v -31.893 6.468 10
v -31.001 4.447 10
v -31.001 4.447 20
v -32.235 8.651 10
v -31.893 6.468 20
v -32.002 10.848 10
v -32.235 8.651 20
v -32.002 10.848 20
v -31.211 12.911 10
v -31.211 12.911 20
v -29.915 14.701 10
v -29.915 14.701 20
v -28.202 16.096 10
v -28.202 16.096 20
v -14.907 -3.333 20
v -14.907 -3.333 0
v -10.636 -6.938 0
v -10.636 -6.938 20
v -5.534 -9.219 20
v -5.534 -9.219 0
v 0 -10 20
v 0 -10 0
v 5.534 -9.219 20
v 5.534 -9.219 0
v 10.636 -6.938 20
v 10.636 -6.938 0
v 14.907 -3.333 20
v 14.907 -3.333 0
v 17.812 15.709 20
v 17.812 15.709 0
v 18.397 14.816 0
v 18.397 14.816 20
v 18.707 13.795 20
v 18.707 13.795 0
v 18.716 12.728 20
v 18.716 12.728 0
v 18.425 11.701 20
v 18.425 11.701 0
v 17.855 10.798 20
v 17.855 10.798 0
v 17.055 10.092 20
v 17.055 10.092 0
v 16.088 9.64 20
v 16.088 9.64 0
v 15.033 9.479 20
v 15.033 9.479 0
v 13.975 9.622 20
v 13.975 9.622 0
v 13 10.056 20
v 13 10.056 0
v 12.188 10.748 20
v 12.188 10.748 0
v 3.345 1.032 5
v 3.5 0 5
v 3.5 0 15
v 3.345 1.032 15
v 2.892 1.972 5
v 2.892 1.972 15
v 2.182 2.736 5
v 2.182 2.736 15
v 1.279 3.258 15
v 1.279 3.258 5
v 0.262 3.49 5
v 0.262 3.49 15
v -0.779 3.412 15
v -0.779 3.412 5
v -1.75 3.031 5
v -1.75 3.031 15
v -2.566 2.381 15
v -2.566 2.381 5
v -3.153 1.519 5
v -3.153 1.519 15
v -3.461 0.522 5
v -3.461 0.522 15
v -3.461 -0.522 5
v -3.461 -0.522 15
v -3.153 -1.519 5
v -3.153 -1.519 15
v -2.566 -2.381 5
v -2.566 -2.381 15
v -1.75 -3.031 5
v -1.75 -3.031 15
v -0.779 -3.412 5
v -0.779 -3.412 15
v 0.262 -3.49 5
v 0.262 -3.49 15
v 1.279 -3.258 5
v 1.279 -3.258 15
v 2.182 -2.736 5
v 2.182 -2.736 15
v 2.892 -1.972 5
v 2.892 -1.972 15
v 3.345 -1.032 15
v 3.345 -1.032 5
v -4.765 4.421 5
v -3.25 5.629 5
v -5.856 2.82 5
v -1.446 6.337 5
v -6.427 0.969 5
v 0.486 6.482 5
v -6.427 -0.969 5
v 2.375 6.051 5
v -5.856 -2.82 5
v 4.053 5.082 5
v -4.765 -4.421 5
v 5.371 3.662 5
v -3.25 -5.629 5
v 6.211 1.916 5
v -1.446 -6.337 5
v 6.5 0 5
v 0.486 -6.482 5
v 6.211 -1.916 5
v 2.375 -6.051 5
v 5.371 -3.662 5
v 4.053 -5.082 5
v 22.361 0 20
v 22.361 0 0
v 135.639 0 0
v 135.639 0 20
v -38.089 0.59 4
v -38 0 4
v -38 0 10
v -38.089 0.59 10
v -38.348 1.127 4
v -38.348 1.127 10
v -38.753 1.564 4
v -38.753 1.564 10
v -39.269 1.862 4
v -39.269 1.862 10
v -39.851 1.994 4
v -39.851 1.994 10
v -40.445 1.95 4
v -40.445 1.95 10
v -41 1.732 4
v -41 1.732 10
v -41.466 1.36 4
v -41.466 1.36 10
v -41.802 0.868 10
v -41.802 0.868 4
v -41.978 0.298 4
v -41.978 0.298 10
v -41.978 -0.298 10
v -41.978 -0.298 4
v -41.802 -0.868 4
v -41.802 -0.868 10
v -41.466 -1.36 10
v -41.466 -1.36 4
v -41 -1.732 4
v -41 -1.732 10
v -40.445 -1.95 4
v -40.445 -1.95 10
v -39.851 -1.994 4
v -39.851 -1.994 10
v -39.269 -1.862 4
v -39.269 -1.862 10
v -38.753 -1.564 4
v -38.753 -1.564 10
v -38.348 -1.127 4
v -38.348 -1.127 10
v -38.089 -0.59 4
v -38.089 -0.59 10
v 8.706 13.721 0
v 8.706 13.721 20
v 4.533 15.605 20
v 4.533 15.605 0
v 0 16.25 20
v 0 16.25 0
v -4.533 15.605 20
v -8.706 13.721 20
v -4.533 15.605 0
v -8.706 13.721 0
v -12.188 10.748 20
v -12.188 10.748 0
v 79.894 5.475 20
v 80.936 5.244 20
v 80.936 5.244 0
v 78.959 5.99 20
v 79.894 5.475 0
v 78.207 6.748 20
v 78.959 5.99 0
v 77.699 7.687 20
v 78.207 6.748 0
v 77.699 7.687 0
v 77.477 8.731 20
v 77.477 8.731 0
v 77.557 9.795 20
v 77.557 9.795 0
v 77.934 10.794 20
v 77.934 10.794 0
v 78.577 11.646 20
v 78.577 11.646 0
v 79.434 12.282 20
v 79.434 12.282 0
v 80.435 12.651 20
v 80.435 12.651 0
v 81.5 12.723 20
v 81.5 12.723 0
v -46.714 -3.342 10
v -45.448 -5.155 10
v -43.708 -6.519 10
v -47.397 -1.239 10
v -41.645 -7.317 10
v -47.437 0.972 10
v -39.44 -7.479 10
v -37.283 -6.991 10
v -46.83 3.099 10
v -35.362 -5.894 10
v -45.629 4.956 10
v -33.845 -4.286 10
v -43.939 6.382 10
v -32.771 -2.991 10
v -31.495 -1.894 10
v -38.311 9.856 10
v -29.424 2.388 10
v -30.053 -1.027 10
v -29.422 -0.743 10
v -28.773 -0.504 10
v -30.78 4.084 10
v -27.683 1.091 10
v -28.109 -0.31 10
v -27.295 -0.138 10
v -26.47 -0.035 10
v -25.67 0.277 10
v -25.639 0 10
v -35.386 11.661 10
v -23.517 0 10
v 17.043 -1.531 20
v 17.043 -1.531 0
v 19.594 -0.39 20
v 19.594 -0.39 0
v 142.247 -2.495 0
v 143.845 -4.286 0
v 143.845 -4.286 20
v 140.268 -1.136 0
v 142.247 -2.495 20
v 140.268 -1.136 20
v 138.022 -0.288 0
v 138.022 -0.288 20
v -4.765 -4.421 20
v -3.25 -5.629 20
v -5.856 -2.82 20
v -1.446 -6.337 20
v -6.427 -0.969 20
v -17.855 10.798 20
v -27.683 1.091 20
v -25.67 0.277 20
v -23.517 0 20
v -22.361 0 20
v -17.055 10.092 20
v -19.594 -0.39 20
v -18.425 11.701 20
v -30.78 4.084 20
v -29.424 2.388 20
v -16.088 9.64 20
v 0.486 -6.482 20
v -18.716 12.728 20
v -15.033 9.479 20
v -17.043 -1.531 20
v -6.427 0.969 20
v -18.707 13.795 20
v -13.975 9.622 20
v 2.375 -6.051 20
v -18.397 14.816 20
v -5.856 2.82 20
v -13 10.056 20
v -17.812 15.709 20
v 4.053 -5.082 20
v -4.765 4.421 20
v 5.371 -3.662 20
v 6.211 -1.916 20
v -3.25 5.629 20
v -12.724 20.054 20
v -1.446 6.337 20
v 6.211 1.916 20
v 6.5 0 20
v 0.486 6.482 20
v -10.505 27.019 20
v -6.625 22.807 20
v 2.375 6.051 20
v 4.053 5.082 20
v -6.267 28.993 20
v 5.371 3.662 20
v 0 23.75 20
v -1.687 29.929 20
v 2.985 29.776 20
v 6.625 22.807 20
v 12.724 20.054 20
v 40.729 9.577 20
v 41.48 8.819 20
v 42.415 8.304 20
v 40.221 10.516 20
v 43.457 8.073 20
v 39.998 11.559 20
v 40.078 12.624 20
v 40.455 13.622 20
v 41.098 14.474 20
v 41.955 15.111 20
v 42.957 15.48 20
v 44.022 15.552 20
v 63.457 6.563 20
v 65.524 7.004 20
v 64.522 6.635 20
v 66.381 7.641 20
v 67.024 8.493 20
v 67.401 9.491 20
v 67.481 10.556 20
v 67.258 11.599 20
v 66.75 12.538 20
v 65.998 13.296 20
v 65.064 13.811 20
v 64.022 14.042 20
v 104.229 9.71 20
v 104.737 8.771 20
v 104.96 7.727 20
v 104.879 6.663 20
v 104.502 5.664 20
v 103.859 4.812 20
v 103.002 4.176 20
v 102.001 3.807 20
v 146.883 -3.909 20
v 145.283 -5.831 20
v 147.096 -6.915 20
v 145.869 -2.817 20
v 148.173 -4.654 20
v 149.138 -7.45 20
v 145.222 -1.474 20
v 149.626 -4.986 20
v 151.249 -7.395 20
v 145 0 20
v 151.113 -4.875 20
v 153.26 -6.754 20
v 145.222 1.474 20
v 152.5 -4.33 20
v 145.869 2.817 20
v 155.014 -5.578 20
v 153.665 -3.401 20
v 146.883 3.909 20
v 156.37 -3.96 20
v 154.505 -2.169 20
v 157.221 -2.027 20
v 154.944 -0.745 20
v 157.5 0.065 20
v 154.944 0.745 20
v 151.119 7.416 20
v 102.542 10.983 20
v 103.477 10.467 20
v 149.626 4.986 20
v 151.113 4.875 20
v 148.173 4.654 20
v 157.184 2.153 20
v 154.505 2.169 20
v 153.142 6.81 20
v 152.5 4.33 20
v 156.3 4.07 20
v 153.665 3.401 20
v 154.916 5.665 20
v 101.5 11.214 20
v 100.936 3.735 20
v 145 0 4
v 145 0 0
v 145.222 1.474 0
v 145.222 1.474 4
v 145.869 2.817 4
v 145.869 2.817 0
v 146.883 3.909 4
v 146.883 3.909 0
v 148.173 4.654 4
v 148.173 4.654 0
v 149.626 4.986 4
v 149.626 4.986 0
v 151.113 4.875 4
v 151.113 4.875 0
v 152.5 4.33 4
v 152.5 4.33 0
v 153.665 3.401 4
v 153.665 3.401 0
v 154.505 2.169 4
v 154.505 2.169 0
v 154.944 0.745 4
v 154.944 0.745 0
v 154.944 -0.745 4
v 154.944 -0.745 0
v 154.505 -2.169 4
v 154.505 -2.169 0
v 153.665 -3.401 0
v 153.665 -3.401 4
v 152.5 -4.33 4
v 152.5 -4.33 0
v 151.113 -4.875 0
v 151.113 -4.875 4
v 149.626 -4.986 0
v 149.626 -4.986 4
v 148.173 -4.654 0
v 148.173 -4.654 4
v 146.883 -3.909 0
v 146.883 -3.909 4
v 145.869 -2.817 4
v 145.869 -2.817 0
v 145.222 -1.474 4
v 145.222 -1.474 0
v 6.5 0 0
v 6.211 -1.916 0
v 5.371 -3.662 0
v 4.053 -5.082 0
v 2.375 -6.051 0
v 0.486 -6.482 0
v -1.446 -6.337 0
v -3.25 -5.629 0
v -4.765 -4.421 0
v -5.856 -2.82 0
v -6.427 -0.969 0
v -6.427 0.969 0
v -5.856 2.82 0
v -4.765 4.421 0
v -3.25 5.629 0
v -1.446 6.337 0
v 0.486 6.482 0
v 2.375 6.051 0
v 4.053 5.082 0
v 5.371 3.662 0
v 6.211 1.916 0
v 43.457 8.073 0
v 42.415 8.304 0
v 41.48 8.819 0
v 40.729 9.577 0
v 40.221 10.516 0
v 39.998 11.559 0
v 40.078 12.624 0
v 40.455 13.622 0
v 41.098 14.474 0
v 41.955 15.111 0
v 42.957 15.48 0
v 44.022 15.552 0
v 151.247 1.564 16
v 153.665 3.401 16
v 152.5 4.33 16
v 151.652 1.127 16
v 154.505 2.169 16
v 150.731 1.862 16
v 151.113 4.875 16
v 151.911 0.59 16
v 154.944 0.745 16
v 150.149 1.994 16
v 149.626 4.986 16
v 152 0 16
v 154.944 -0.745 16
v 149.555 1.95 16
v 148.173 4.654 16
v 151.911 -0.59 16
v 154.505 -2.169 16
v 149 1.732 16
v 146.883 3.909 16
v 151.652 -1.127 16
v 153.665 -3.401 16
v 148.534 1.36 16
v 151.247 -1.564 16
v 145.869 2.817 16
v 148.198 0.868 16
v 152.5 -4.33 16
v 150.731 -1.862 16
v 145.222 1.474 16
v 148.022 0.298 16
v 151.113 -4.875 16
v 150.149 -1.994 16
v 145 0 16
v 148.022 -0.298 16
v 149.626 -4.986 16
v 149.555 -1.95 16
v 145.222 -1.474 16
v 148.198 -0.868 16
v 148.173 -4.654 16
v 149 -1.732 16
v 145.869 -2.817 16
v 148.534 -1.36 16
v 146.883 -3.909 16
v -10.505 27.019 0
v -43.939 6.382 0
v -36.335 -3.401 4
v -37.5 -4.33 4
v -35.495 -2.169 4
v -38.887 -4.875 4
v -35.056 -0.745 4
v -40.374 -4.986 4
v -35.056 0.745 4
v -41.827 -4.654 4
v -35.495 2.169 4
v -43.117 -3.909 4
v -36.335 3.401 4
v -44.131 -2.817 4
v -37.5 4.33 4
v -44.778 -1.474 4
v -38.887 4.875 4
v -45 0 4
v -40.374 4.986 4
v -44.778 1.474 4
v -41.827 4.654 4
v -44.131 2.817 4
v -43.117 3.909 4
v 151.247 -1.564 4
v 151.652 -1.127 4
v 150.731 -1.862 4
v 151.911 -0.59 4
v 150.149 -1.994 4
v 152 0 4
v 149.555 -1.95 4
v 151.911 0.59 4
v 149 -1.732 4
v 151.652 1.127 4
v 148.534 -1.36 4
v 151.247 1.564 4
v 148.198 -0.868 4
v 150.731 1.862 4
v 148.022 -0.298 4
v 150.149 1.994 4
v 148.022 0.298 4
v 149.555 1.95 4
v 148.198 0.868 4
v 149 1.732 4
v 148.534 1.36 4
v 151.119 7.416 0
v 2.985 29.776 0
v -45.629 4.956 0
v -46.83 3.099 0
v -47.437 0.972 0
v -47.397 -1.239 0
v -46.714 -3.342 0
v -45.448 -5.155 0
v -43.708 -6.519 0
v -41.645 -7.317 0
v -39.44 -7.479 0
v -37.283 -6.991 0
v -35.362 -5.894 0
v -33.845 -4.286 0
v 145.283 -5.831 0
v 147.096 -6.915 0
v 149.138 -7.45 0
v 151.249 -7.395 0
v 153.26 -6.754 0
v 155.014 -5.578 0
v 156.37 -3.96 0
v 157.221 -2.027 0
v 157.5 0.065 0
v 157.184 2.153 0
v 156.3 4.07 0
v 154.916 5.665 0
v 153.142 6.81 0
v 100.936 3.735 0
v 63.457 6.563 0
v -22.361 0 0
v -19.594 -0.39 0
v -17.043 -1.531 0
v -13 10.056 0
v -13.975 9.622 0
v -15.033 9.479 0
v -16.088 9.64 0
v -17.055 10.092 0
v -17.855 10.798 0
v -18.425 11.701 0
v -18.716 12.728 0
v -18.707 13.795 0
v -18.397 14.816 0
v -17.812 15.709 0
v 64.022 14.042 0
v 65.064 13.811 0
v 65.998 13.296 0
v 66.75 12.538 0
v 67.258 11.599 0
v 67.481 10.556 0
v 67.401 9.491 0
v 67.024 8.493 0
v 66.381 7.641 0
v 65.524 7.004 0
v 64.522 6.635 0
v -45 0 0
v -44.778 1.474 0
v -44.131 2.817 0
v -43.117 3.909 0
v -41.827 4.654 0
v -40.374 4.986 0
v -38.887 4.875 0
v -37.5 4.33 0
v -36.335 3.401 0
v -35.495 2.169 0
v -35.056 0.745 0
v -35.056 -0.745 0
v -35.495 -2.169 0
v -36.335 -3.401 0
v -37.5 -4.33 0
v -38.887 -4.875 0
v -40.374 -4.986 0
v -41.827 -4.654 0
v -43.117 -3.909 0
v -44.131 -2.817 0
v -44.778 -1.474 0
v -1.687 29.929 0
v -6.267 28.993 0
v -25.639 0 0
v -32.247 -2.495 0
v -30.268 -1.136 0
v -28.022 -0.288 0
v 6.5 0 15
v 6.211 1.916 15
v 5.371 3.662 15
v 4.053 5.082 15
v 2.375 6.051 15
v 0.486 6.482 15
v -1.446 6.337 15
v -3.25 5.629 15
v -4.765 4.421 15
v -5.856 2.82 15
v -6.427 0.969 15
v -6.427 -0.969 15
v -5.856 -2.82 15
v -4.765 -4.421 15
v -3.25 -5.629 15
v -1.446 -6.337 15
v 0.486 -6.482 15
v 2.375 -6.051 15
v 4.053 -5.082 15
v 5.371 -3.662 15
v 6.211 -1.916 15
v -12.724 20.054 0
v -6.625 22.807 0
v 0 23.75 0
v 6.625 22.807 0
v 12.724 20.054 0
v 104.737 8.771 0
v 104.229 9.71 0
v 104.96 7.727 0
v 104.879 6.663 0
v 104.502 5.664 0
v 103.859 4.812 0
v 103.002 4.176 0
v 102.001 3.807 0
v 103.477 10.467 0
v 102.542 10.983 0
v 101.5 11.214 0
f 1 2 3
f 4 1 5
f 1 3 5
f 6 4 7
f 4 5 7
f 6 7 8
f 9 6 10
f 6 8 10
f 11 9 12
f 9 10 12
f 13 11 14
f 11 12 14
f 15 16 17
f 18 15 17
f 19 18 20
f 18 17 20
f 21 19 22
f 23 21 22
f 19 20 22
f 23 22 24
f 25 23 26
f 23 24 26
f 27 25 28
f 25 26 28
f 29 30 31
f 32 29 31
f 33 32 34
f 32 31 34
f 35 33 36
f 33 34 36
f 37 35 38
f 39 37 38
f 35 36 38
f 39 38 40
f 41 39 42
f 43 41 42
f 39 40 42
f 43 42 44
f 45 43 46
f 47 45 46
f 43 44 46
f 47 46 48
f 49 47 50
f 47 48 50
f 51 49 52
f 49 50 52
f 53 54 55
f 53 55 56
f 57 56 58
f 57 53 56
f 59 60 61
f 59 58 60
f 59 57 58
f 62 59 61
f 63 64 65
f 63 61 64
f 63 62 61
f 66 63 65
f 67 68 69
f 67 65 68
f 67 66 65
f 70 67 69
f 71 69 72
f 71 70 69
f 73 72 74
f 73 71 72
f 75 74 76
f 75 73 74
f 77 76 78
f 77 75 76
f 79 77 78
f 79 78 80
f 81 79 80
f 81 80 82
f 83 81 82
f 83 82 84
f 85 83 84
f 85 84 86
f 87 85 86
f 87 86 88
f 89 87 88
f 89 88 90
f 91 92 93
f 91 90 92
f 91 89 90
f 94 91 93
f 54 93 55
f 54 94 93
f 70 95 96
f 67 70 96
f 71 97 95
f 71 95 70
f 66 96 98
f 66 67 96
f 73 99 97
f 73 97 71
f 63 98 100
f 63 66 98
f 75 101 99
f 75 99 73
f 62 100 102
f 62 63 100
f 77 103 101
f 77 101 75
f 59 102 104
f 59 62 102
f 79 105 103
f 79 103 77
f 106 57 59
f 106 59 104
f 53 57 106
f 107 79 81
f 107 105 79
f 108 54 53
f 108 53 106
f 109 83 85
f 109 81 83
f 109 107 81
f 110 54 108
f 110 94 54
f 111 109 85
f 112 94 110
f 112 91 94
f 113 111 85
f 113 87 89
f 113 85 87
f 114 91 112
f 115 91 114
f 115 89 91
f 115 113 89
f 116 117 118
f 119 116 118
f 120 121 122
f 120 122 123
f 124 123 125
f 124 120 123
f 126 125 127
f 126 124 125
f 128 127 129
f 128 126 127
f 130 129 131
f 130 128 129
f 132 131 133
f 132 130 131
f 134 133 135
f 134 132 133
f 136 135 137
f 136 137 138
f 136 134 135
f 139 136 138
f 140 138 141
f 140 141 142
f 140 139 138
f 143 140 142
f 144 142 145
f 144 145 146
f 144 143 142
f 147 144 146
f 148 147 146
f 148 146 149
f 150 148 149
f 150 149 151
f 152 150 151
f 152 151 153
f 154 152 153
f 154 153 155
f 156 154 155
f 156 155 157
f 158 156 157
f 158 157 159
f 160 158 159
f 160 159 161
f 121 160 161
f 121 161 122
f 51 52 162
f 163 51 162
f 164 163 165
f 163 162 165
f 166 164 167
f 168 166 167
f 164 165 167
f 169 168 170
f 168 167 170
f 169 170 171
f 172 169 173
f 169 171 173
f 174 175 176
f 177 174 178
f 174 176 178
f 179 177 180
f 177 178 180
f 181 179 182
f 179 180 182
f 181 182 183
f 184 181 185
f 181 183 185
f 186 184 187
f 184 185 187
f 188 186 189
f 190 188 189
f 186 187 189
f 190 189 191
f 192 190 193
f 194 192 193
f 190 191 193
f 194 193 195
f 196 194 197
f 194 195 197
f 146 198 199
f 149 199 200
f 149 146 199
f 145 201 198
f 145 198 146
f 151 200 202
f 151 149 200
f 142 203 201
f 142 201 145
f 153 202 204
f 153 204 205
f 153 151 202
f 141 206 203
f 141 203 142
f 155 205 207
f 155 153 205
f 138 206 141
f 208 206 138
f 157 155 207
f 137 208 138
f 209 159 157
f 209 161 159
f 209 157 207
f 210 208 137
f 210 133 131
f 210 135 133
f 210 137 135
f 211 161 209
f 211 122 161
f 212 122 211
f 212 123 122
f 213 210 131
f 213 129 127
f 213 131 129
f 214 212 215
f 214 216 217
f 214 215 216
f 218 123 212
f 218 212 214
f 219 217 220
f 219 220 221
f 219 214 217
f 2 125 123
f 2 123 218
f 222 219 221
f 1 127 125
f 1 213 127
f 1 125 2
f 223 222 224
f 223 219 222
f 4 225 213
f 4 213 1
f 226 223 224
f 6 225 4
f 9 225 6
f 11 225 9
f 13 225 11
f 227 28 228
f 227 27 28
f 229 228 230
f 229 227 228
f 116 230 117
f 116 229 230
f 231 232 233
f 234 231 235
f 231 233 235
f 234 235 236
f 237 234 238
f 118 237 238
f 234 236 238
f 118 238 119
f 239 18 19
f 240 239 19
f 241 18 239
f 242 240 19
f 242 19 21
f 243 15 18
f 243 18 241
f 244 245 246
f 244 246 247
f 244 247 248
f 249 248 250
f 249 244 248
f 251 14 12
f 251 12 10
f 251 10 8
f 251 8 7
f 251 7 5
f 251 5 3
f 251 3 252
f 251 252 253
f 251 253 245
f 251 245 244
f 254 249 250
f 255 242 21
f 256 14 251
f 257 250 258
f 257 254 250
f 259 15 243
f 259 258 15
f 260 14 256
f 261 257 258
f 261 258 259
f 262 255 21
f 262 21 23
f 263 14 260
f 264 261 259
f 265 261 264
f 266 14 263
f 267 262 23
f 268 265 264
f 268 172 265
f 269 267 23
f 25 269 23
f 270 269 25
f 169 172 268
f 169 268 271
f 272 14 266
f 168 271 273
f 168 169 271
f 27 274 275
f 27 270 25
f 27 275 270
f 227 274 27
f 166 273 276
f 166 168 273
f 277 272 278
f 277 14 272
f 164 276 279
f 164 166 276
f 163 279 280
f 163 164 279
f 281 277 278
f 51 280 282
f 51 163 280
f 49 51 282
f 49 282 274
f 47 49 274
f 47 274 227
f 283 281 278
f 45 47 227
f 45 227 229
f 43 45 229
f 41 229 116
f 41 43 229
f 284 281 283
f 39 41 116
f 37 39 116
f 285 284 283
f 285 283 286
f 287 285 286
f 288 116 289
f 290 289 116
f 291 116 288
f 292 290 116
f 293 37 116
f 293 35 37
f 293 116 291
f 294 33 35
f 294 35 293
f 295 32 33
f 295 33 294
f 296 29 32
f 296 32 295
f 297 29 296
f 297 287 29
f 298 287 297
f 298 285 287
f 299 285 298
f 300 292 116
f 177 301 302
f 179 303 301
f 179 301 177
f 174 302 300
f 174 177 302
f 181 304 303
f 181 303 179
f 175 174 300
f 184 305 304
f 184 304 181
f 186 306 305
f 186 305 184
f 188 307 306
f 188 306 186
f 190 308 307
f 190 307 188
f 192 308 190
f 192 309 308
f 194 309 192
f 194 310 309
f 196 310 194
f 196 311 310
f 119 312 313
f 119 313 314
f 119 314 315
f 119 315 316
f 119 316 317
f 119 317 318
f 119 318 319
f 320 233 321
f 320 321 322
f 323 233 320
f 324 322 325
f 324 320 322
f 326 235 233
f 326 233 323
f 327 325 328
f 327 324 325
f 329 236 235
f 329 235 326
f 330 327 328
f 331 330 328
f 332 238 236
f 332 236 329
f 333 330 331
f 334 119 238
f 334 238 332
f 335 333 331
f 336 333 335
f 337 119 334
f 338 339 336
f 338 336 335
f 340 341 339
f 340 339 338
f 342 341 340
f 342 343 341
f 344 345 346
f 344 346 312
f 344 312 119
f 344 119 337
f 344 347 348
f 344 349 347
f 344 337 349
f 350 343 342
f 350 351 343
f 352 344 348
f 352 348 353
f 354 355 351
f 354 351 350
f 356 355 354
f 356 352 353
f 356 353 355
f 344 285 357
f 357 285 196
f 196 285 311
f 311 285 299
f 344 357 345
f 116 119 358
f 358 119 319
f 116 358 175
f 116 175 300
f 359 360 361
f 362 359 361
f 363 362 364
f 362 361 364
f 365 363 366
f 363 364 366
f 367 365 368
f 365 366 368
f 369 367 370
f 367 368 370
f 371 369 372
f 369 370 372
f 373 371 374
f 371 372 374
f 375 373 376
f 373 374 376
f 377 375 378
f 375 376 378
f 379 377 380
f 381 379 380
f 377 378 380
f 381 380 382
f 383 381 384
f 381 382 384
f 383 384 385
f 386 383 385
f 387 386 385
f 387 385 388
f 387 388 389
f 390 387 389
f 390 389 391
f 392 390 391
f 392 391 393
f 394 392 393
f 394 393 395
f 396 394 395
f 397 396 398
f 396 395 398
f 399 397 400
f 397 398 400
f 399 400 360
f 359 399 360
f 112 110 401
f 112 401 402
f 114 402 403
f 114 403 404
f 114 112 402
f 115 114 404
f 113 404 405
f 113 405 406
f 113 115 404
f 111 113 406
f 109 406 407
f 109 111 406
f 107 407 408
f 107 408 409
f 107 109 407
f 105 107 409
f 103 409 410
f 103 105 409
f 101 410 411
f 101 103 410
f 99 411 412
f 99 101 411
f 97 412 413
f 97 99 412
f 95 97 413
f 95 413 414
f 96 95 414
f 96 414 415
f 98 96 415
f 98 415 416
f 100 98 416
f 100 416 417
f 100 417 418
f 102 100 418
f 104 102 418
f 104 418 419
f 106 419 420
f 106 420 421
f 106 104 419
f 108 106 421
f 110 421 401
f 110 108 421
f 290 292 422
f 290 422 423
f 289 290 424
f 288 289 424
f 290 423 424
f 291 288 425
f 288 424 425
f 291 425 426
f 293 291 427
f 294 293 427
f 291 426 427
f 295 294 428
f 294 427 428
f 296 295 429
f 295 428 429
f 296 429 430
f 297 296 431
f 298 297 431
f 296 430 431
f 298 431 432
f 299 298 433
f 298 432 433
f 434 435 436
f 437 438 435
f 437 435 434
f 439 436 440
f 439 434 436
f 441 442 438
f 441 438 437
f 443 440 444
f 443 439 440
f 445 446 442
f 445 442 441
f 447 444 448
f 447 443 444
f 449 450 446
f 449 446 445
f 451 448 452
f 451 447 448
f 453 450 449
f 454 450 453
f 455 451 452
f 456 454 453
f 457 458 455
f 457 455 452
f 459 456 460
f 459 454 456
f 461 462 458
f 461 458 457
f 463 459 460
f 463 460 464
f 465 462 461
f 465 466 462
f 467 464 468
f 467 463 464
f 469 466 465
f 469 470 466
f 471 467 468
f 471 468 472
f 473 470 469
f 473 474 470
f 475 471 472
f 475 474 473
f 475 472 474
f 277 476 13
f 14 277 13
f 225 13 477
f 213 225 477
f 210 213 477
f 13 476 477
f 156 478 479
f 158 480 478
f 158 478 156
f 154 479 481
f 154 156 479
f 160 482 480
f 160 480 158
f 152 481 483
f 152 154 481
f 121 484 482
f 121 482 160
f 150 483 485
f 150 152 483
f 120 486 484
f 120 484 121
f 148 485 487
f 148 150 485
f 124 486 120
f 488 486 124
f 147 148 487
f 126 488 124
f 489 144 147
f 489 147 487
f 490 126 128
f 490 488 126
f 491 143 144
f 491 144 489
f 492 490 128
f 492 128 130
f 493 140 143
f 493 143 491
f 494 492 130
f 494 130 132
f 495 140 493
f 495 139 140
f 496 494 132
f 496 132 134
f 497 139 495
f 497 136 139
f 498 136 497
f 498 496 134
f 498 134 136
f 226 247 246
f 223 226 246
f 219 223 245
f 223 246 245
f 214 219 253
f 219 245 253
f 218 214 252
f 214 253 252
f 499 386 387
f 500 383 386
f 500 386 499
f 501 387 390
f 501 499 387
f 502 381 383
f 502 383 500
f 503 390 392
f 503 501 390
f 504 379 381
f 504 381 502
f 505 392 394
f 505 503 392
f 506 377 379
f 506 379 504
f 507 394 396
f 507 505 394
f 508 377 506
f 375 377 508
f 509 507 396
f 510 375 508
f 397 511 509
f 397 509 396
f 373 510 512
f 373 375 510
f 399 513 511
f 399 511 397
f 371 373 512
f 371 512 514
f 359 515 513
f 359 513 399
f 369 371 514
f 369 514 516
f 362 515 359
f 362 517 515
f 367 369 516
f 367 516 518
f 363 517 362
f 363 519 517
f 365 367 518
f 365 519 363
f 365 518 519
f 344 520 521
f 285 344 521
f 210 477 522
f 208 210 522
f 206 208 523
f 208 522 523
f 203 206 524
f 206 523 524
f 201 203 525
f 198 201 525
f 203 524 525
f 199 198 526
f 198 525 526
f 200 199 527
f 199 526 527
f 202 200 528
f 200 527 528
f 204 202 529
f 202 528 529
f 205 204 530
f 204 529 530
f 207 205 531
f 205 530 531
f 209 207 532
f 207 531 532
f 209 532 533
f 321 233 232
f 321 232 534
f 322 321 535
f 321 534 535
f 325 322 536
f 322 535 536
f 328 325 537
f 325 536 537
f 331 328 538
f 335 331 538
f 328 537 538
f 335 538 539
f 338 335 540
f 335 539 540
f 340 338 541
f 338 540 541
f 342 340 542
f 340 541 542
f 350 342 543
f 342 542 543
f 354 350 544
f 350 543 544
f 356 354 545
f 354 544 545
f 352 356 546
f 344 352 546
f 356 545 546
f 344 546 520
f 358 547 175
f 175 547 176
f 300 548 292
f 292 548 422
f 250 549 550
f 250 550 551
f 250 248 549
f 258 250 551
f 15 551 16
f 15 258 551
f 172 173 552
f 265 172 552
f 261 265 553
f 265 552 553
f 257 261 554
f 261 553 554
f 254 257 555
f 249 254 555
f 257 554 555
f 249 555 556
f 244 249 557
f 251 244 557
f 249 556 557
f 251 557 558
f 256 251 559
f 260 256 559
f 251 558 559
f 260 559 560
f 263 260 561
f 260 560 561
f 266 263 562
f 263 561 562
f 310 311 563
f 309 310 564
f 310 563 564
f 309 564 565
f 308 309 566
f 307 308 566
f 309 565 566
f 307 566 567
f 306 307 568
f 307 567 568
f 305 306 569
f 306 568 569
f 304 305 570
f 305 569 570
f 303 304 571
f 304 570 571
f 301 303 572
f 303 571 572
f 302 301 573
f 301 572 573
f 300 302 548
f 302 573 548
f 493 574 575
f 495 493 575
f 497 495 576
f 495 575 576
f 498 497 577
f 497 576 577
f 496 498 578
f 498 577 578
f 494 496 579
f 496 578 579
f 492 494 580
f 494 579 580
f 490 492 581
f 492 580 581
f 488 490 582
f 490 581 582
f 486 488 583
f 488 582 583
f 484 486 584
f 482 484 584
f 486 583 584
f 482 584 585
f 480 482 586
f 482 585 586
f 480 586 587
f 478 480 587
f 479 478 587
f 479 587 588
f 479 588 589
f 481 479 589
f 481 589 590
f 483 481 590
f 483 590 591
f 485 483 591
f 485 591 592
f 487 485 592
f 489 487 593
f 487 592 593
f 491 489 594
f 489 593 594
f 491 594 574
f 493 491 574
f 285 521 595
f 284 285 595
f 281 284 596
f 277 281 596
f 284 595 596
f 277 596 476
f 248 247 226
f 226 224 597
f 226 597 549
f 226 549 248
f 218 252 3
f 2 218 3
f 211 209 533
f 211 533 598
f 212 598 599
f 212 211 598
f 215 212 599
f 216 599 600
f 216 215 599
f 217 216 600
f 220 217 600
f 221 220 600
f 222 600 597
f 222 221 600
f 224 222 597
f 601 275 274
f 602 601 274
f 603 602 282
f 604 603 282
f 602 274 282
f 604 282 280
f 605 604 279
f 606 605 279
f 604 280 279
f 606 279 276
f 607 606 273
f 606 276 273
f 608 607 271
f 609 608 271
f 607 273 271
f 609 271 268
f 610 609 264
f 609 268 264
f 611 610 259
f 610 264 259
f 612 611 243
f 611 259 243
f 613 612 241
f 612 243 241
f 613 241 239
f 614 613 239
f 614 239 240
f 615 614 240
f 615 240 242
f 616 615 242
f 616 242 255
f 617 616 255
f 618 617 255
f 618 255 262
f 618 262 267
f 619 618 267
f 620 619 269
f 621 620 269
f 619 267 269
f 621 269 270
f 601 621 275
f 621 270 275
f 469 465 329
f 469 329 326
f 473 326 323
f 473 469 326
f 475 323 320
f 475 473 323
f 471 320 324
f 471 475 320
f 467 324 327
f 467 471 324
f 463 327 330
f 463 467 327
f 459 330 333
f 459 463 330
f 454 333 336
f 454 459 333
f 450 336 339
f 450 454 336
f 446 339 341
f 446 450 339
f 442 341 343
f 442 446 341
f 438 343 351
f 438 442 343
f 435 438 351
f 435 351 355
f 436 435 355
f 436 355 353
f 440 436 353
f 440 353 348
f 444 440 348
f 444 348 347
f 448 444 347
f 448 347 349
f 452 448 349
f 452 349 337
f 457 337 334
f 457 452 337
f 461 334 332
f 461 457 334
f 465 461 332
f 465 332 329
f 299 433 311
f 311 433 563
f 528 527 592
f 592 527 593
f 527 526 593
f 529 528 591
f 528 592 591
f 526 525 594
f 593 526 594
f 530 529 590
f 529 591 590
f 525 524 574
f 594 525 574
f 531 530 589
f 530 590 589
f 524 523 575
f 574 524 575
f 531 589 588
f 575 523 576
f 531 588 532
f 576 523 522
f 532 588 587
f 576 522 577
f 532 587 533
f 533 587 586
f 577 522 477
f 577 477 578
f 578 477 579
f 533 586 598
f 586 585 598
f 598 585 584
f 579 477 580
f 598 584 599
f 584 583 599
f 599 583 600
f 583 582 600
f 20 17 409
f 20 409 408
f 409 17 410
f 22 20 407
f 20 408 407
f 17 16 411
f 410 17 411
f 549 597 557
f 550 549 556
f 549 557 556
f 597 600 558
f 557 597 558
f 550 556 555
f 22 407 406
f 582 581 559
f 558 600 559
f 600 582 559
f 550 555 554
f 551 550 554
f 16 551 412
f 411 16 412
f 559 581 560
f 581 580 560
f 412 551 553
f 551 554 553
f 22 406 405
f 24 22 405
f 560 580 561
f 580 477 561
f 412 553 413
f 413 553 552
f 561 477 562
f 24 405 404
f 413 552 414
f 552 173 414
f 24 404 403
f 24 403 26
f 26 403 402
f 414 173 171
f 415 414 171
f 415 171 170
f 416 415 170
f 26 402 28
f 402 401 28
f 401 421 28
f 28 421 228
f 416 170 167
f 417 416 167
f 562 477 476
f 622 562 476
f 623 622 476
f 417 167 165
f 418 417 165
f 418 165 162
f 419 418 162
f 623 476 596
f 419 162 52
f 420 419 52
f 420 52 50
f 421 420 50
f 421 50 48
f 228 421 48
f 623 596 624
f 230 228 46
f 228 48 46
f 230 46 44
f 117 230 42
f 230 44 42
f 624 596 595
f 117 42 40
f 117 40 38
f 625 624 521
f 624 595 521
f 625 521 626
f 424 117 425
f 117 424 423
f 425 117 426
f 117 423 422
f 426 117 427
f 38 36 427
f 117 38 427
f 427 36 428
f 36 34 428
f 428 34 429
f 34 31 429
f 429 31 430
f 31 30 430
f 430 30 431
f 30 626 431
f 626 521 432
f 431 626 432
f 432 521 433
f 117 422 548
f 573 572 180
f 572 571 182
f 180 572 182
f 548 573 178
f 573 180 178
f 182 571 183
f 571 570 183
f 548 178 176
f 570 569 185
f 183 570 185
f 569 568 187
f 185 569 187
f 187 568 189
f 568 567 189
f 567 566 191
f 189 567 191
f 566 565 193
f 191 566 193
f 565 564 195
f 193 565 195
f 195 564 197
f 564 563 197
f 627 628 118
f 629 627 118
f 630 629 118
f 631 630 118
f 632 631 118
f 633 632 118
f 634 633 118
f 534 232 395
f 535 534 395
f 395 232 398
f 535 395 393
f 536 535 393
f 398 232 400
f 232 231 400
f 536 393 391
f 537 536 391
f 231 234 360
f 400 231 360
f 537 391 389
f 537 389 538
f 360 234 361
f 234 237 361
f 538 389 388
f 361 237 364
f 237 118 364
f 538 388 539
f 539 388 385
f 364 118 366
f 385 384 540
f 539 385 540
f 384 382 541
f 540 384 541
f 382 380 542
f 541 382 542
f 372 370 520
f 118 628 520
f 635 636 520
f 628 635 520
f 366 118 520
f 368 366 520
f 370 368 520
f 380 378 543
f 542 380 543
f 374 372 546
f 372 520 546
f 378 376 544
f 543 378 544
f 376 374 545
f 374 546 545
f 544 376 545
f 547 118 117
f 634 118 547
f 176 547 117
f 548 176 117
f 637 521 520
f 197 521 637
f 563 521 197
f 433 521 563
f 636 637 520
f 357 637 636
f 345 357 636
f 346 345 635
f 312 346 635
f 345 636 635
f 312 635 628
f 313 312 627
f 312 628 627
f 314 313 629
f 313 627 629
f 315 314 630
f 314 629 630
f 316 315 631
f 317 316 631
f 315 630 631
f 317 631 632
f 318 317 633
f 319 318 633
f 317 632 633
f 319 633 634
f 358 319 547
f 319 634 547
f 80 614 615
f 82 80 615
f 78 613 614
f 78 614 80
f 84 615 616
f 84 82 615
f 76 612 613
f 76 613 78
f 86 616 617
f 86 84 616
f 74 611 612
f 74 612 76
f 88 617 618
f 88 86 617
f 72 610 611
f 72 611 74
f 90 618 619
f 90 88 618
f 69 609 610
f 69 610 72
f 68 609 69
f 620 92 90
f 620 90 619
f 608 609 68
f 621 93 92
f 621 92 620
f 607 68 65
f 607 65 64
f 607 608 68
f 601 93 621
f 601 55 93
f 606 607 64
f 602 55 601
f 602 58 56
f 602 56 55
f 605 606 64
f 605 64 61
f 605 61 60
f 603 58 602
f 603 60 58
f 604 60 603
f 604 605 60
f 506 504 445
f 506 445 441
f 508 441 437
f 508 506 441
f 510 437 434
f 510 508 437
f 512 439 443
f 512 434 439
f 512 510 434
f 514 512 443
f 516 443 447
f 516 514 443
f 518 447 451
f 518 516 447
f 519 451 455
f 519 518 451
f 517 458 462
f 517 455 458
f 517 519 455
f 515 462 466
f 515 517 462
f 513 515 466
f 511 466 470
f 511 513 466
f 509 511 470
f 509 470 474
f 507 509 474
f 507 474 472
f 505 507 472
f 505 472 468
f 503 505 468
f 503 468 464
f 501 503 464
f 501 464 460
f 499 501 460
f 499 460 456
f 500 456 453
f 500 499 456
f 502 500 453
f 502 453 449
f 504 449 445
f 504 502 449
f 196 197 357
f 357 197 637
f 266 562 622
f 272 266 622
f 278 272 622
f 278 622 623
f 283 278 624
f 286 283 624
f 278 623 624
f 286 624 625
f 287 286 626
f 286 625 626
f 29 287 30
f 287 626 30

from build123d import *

# Parameters (mm, degrees)
SKETCH1_R           = 3.5
SKETCH1_R_2         = 2
BOSS_EXTRUDE1_DEPTH = 20
FILLET1_R           = 10
SKETCH2_R           = 2
CUT_EXTRUDE4_DEPTH  = 10
FILLET3_R           = 8.5
SKETCH3_R           = 6.5
CUT_EXTRUDE5_DEPTH  = 5
CUT_EXTRUDE7_START  = -5
SKETCH5_R           = 6.5
CUT_EXTRUDE7_DEPTH  = 5
SKETCH7_R           = 5
CUT_EXTRUDE8_DEPTH  = 4
CUT_EXTRUDE9_START  = -4
SKETCH8_R           = 5
CUT_EXTRUDE9_DEPTH  = 4


with BuildPart() as part:
    # Sketch1 → Boss-Extrude1 (new body)
    with BuildSketch(Plane.XY):
        with BuildLine():
            Line((-10.504774602, 27.019098406), (-43.939290476, 6.382161902))
            ThreePointArc((-43.939290476, 6.382161902), (-43.654129269, -6.54960604), (-32.5, 0))
            Line((-32.5, 0), (-17.320508076, 0))
            ThreePointArc((-17.320508076, 0), (0, -10), (17.320508076, 0))
            Line((17.320508076, 0), (142.5, 0))
            ThreePointArc((142.5, 0), (154.891549026, -5.685309853), (151.1193995, 7.4159925))
            Line((151.1193995, 7.4159925), (2.985065333, 29.77598))
            ThreePointArc((2.985065333, 29.77598), (-4.004573123, 29.594983902), (-10.504774602, 27.019098406))
        make_face()
        with BuildLine():
            ThreePointArc((12.1875, 10.748364701), (0, 16.25), (-12.1875, 10.748364701))
            ThreePointArc((-12.1875, 10.748364701), (-17.480391854, 10.416256555), (-17.8125, 15.709148409))
            ThreePointArc((-17.8125, 15.709148409), (0, 23.75), (17.8125, 15.709148409))
            ThreePointArc((17.8125, 15.709148409), (17.480391854, 10.416256555), (12.1875, 10.748364701))
        make_face(mode=Mode.SUBTRACT)
        with BuildLine():
            Line((44.021582733, 15.551547034), (64.021582733, 14.042107131))
            ThreePointArc((64.021582733, 14.042107131), (67.478730737, 10.020524397), (63.457148004, 6.563376394))
            Line((63.457148004, 6.563376394), (43.457148004, 8.072816297))
            ThreePointArc((43.457148004, 8.072816297), (40, 12.09439903), (44.021582733, 15.551547034))
        make_face(mode=Mode.SUBTRACT)
        with BuildLine():
            ThreePointArc((80.93587874, 5.244221712), (77.478730737, 9.265804446), (81.50031347, 12.722952449))
            Line((81.50031347, 12.722952449), (101.50031347, 11.213512546))
            ThreePointArc((101.50031347, 11.213512546), (104.957461474, 7.191929813), (100.93587874, 3.734781809))
            Line((100.93587874, 3.734781809), (80.93587874, 5.244221712))
        make_face(mode=Mode.SUBTRACT)
        Circle(SKETCH1_R, mode=Mode.SUBTRACT)
        with Locations((-40, 0)):
            Circle(SKETCH1_R_2, mode=Mode.SUBTRACT)
        with Locations((150, 0)):
            Circle(SKETCH1_R_2, mode=Mode.SUBTRACT)
    extrude(amount=BOSS_EXTRUDE1_DEPTH)

    # Fillet1
    fillet1_edges = [part.edges().sort_by_distance(p)[0] for p in [
        (-32.5, 0, 10),
        (142.5, 0, 10),
        (17.320508076, 0, 10),
        (-17.320508076, 0, 10),
    ]]
    fillet(fillet1_edges, radius=FILLET1_R)

    # Sketch2 → Cut-Extrude4 (cut)
    # profile 1 of 3: a face of its own
    with BuildSketch(Plane.XY.offset(20)):
        with BuildLine():
            ThreePointArc((-30, 0), (-30.37066789, 2.697399324), (-31.455192622, 5.194830784))
            ThreePointArc((-31.455192622, 5.194830784), (-34.377165478, 8.269445685), (-38.310752735, 9.856289549))
            Line((-38.310752735, 9.856289549), (-43.939290476, 6.382161902))
            ThreePointArc((-43.939290476, 6.382161902), (-45.44776232, -5.154792498), (-33.84511145, -4.285714286))
            ThreePointArc((-33.84511145, -4.285714286), (-32.155948906, -2.415537132), (-30.052880016, -1.027036525))
            ThreePointArc((-30.052880016, -1.027036525), (-30.013228754, -0.514198483), (-30, 0))
        make_face()
        with Locations((-40, 0)):
            Circle(SKETCH2_R, mode=Mode.SUBTRACT)
    # profile 2 of 3: a face of its own
    with BuildSketch(Plane.XY.offset(20)):
        with BuildLine():
            Line((-31.455192622, 5.194830784), (-35.386468794, 11.661258469))
            Line((-35.386468794, 11.661258469), (-38.310752735, 9.856289549))
            ThreePointArc((-38.310752735, 9.856289549), (-34.377165478, 8.269445685), (-31.455192622, 5.194830784))
        make_face()
    # profile 3 of 3: a face of its own
    with BuildSketch(Plane.XY.offset(20)):
        with BuildLine():
            Line((-28.108612186, -0.309849995), (-31.455192622, 5.194830784))
            ThreePointArc((-31.455192622, 5.194830784), (-30.37066789, 2.697399324), (-30, 0))
            ThreePointArc((-30, 0), (-30.013228754, -0.514198483), (-30.052880016, -1.027036525))
            ThreePointArc((-30.052880016, -1.027036525), (-29.099374287, -0.617942894), (-28.108612186, -0.309849995))
        make_face()
    extrude(amount=-CUT_EXTRUDE4_DEPTH, mode=Mode.SUBTRACT)

    # Fillet3
    # the kernel refuses this fillet: 8.5 mm, written as the material it takes off along each edge
    with BuildSketch(Plane(origin=(-35.386468794, 11.661258469, 41.107049778), x_dir=(0.85095492032363, 0.5252387300809077, 0), z_dir=(0, 0, -1))) as fillet3_piece_1:
        with BuildLine():
            CenterArc((FILLET3_R * 0.993272930738, FILLET3_R), FILLET3_R, 180.386732, 89.613268)
            Line((-FILLET3_R * 0.00670428980784, FILLET3_R * 0.993250304523), (0, 0))
            Line((0, 0), (FILLET3_R * 0.993272930738, 0))
        make_face()
    extrude(amount=31.107049778, mode=Mode.SUBTRACT)
    with BuildSketch(Plane(origin=(-28.108612186, -0.309849995, 32.856474207), x_dir=(0.9977308400995106, 0.06732882528549343, 0), z_dir=(0, 0, -1))) as fillet3_piece_2:
        with BuildLine():
            CenterArc((5.174335728, -8.480712141), FILLET3_R, 93.86057806, 58.702416165)
            Line((-2.369567013, -4.564140753), (-3.123957287, -4.172483615))
            Line((-3.123957287, -4.172483615), (-0.754390274, 0.391657139))
            Line((-0.754390274, 0.391657139), (0.154018939, 0.835929522))
            ThreePointArc((0.154018939, 0.835929522), (2.428046269, 0.705227783), (4.544811212, 0.848071214))
            Line((4.544811212, 0.848071214), (4.602040713, 0))
        make_face()
    extrude(amount=22.856474207, mode=Mode.SUBTRACT)

    # Sketch3 → Cut-Extrude5 (cut)
    with BuildSketch(Plane.XY.offset(20)):
        Circle(SKETCH3_R)
    extrude(amount=-CUT_EXTRUDE5_DEPTH, mode=Mode.SUBTRACT)

    # Sketch5 → Cut-Extrude7 (cut)
    with BuildSketch(Plane(origin=(0, 0, 0), x_dir=(-1, 0, 0), z_dir=(0, 0, -1)).offset(CUT_EXTRUDE7_START)):
        with Locations(Location((0, 0, 0), (0, 0, 180))):
            Circle(SKETCH5_R)
    extrude(amount=CUT_EXTRUDE7_DEPTH, mode=Mode.SUBTRACT)

    # Sketch7 → Cut-Extrude8 (cut)
    with BuildSketch(Plane(origin=(0, 0, 0), x_dir=(-1, 0, 0), z_dir=(0, 0, -1))):
        with Locations((-150, 0)):
            Circle(SKETCH7_R)
        with Locations((40, 0)):
            Circle(SKETCH7_R)
    extrude(amount=-CUT_EXTRUDE8_DEPTH, mode=Mode.SUBTRACT)

    # Sketch8 → Cut-Extrude9 (cut)
    with BuildSketch(Plane.XY.offset(20).offset(CUT_EXTRUDE9_START)):
        with Locations(Location((150, 0, 0), (0, 0, 180))):
            Circle(SKETCH8_R)
    extrude(amount=CUT_EXTRUDE9_DEPTH, mode=Mode.SUBTRACT)


solid = part.part
